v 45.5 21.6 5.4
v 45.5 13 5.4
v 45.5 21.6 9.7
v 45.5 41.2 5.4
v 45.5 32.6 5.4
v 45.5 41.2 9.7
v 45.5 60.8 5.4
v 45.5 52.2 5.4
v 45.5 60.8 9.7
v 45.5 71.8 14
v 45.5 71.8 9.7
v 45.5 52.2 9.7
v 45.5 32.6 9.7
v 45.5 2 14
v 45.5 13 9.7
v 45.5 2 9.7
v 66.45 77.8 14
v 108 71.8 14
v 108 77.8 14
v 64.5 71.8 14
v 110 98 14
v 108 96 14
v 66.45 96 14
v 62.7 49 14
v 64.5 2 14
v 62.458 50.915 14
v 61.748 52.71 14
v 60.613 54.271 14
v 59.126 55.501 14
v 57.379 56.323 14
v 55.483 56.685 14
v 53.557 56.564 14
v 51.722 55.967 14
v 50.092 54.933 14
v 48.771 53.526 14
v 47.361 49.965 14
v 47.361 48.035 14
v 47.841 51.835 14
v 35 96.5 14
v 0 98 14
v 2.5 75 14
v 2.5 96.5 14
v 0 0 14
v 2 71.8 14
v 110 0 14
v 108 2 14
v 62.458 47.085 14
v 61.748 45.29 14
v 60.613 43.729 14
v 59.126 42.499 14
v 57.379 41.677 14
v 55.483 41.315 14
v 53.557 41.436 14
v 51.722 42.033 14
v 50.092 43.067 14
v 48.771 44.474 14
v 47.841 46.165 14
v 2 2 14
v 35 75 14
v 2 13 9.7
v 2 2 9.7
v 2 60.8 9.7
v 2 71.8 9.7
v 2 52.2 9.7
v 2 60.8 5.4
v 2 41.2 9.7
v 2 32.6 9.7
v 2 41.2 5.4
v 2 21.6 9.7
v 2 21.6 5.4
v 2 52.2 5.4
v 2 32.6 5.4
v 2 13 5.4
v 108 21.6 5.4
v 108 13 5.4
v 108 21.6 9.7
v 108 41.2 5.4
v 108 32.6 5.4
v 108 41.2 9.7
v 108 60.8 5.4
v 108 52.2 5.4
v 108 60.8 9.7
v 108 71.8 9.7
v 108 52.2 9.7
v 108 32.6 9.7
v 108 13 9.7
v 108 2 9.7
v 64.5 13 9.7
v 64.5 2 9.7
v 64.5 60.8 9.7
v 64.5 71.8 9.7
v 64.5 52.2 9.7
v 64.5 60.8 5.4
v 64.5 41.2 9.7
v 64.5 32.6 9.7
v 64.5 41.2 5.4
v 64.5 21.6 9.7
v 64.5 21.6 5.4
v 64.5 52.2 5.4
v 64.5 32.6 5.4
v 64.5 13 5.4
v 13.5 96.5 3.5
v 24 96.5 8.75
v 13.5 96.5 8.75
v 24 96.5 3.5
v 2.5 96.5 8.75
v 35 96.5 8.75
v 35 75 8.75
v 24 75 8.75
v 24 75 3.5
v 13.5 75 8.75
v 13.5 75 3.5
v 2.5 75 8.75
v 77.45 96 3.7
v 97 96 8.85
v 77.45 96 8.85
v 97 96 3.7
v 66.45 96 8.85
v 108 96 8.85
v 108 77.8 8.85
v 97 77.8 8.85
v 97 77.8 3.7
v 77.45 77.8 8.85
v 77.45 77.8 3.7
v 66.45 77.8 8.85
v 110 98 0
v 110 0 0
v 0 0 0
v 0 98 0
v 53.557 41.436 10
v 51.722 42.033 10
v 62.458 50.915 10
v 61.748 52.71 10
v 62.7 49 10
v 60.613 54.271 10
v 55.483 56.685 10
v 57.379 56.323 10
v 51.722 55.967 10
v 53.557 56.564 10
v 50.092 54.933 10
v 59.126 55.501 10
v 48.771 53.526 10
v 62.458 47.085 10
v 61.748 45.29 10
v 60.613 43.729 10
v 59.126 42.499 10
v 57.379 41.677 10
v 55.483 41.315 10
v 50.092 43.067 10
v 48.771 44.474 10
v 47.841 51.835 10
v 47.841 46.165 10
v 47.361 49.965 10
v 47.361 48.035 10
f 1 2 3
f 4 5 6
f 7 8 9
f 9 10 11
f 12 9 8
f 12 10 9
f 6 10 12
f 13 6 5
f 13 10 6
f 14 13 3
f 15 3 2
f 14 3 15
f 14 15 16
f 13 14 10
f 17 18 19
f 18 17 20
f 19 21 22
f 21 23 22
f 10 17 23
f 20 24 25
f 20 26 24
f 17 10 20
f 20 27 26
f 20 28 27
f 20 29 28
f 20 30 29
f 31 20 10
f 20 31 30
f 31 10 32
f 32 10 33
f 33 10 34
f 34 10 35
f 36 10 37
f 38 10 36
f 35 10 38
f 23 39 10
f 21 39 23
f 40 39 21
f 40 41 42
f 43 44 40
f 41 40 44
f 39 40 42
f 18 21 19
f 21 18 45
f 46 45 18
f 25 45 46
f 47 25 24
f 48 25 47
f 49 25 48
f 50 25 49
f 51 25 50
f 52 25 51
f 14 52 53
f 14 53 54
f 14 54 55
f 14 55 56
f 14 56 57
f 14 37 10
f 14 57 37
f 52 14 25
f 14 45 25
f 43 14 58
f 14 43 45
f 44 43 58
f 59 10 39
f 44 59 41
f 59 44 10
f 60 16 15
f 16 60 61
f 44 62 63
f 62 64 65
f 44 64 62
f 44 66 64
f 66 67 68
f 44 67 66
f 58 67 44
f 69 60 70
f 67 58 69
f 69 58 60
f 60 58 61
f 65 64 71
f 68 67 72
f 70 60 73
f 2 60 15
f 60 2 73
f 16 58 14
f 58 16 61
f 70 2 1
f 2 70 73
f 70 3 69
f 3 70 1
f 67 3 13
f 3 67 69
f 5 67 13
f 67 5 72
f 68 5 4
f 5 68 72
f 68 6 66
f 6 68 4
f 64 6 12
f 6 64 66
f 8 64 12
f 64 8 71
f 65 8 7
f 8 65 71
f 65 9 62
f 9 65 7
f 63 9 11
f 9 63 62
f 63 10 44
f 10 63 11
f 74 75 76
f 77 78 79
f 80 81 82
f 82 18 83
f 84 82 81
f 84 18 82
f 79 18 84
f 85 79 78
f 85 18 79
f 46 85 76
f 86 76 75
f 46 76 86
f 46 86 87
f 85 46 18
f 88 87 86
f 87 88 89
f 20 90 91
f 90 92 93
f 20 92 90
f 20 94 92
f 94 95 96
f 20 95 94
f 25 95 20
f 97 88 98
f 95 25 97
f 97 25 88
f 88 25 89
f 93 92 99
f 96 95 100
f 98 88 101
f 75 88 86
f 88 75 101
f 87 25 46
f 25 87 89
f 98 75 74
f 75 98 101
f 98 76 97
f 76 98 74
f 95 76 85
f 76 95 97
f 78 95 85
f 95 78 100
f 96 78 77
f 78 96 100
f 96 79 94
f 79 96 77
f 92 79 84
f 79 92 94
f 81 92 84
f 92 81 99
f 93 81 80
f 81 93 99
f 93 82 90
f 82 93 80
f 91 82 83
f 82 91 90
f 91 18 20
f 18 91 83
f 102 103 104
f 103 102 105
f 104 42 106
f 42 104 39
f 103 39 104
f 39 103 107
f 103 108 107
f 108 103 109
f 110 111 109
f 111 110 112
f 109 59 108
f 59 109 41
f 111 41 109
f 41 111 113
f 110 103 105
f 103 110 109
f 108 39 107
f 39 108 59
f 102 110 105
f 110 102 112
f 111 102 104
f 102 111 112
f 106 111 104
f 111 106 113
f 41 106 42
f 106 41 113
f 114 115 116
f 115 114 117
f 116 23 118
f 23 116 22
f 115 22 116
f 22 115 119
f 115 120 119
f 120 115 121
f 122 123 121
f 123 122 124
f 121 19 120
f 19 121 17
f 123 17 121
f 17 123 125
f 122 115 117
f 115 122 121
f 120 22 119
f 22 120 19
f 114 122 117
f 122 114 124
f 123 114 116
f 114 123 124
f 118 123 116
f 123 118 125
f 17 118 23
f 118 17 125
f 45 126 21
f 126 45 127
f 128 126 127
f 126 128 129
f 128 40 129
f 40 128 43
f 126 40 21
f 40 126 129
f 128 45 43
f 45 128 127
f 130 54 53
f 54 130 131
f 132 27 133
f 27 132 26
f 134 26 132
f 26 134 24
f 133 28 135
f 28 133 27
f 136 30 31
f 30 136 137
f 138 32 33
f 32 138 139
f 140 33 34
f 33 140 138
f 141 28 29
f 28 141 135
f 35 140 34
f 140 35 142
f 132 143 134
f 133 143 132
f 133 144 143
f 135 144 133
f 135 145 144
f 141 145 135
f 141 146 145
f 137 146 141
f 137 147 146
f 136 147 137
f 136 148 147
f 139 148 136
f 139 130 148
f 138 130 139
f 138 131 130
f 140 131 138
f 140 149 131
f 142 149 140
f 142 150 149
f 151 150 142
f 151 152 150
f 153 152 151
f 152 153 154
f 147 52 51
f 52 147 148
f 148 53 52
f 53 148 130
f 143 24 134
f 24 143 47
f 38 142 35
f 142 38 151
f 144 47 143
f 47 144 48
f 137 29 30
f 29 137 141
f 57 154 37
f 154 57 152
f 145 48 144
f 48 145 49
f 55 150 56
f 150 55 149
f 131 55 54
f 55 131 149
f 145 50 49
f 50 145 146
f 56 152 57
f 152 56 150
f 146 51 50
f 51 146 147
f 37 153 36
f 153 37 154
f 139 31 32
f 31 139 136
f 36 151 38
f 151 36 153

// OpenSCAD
length = 110;
width = 98;
height = 14;
magnetPadding = 15;
magnetBaseInnerDiameter = 15.4;
magnetHeight = 4.0;

plasticCubeSide = 10.5;
plasticCubeBoxHeight = plasticCubeSide;
plasticCubeBoxWidth = plasticCubeSide;

woodenCubeSide = 8.6;
woodenCubeBoxHeight = woodenCubeSide;
woodenCubeBoxWidth = woodenCubeSide;

wallThickness = 2;

fingerNotchSize = 11;
woodenCubeCount = 5;
woodenCubeBoxLength = woodenCubeSide * woodenCubeCount + .5;

plasticCubeCount = 2;
plasticCubeBoxLength = plasticCubeSide * plasticCubeCount + .5;

meepleBoxHeight = 9.8 + .5;
meepleBoxWidth = 19.05 + .5;
meepleBoxLength = 17.7 + .5;


//      30 cubes, 7.85-8.1 (use woodenCubeSide) cubed
//		2 cubes, 10 cubed
//		1 player token
//			orange
//				17.25 width, 18.8 tall, 10.0 thick
//			blue
//				19.7 width, 18.7 tall, 9.95 thick
//			purple
//				17.4 width, 19.5 tall, 10.0 tall
//			white
//				17.7 width, 19.05 tall, 9.8 thick
 
//    rotate([0,0,90])
   
        
        

    difference(){
        cube([length, width, height]);  
        translate([wallThickness, wallThickness, 0])
            WoodenCubeBoxes();
        translate([length - (wallThickness + woodenCubeBoxLength), wallThickness, 0])
            WoodenCubeBoxes();
        rotate([0,0,90])
            translate([75,-35, 0])
                PlasticCubeBox();
        //magnet
        translate([
            length/2,
            width/2,
            height - magnetHeight])
            cylinder(magnetHeight, d=magnetBaseInnerDiameter);
        
        translate([length - wallThickness, width - (wallThickness + meepleBoxLength), 0])
            rotate([0,0,90])
            MeepleBox();

    }
    
module WoodenCubeBoxes()
{
    translate([0,0, 0])
    {
        WoodenCubeBox();
    }
    translate([0,fingerNotchSize + woodenCubeSide, 0])
    {
        WoodenCubeBox();
    }
    translate([0,fingerNotchSize * 2 + woodenCubeSide * 2, 0])
    {
        WoodenCubeBox();
    }
}

module WoodenCubeBox()
{
    translate([0, 0, height - (woodenCubeBoxHeight/2)])
        cube([woodenCubeBoxLength, fingerNotchSize, woodenCubeBoxHeight / 2]);
    translate([0, 0 + fingerNotchSize, height - woodenCubeBoxHeight])
        cube([woodenCubeBoxLength, woodenCubeBoxWidth, woodenCubeBoxHeight]);
    translate([0, 0 + fingerNotchSize + woodenCubeBoxWidth, height - (woodenCubeBoxHeight/2)])
        cube([woodenCubeBoxLength, fingerNotchSize, woodenCubeBoxHeight / 2]);
}

module PlasticCubeBox()
{
    translate([0, 0, height - (plasticCubeBoxHeight/2)])
        cube([plasticCubeBoxLength, fingerNotchSize, plasticCubeBoxHeight / 2]);
    translate([0, 0 + fingerNotchSize, height - plasticCubeBoxHeight])
        cube([plasticCubeBoxLength, plasticCubeBoxWidth, plasticCubeBoxHeight]);
    translate([0, 0 + fingerNotchSize + plasticCubeBoxWidth, height - (plasticCubeBoxHeight/2)])
        cube([plasticCubeBoxLength, fingerNotchSize, plasticCubeBoxHeight / 2]);
}

module MeepleBox()
{
    translate([0, 0, height - (meepleBoxHeight/2)])
        cube([meepleBoxLength, fingerNotchSize, meepleBoxHeight / 2]);
    translate([0, 0 + fingerNotchSize, height - meepleBoxHeight])
        cube([meepleBoxLength, meepleBoxWidth, meepleBoxHeight]);
    translate([0, 0 + fingerNotchSize + meepleBoxWidth, height - (meepleBoxHeight/2)])
        cube([meepleBoxLength, fingerNotchSize, meepleBoxHeight / 2]);
}
